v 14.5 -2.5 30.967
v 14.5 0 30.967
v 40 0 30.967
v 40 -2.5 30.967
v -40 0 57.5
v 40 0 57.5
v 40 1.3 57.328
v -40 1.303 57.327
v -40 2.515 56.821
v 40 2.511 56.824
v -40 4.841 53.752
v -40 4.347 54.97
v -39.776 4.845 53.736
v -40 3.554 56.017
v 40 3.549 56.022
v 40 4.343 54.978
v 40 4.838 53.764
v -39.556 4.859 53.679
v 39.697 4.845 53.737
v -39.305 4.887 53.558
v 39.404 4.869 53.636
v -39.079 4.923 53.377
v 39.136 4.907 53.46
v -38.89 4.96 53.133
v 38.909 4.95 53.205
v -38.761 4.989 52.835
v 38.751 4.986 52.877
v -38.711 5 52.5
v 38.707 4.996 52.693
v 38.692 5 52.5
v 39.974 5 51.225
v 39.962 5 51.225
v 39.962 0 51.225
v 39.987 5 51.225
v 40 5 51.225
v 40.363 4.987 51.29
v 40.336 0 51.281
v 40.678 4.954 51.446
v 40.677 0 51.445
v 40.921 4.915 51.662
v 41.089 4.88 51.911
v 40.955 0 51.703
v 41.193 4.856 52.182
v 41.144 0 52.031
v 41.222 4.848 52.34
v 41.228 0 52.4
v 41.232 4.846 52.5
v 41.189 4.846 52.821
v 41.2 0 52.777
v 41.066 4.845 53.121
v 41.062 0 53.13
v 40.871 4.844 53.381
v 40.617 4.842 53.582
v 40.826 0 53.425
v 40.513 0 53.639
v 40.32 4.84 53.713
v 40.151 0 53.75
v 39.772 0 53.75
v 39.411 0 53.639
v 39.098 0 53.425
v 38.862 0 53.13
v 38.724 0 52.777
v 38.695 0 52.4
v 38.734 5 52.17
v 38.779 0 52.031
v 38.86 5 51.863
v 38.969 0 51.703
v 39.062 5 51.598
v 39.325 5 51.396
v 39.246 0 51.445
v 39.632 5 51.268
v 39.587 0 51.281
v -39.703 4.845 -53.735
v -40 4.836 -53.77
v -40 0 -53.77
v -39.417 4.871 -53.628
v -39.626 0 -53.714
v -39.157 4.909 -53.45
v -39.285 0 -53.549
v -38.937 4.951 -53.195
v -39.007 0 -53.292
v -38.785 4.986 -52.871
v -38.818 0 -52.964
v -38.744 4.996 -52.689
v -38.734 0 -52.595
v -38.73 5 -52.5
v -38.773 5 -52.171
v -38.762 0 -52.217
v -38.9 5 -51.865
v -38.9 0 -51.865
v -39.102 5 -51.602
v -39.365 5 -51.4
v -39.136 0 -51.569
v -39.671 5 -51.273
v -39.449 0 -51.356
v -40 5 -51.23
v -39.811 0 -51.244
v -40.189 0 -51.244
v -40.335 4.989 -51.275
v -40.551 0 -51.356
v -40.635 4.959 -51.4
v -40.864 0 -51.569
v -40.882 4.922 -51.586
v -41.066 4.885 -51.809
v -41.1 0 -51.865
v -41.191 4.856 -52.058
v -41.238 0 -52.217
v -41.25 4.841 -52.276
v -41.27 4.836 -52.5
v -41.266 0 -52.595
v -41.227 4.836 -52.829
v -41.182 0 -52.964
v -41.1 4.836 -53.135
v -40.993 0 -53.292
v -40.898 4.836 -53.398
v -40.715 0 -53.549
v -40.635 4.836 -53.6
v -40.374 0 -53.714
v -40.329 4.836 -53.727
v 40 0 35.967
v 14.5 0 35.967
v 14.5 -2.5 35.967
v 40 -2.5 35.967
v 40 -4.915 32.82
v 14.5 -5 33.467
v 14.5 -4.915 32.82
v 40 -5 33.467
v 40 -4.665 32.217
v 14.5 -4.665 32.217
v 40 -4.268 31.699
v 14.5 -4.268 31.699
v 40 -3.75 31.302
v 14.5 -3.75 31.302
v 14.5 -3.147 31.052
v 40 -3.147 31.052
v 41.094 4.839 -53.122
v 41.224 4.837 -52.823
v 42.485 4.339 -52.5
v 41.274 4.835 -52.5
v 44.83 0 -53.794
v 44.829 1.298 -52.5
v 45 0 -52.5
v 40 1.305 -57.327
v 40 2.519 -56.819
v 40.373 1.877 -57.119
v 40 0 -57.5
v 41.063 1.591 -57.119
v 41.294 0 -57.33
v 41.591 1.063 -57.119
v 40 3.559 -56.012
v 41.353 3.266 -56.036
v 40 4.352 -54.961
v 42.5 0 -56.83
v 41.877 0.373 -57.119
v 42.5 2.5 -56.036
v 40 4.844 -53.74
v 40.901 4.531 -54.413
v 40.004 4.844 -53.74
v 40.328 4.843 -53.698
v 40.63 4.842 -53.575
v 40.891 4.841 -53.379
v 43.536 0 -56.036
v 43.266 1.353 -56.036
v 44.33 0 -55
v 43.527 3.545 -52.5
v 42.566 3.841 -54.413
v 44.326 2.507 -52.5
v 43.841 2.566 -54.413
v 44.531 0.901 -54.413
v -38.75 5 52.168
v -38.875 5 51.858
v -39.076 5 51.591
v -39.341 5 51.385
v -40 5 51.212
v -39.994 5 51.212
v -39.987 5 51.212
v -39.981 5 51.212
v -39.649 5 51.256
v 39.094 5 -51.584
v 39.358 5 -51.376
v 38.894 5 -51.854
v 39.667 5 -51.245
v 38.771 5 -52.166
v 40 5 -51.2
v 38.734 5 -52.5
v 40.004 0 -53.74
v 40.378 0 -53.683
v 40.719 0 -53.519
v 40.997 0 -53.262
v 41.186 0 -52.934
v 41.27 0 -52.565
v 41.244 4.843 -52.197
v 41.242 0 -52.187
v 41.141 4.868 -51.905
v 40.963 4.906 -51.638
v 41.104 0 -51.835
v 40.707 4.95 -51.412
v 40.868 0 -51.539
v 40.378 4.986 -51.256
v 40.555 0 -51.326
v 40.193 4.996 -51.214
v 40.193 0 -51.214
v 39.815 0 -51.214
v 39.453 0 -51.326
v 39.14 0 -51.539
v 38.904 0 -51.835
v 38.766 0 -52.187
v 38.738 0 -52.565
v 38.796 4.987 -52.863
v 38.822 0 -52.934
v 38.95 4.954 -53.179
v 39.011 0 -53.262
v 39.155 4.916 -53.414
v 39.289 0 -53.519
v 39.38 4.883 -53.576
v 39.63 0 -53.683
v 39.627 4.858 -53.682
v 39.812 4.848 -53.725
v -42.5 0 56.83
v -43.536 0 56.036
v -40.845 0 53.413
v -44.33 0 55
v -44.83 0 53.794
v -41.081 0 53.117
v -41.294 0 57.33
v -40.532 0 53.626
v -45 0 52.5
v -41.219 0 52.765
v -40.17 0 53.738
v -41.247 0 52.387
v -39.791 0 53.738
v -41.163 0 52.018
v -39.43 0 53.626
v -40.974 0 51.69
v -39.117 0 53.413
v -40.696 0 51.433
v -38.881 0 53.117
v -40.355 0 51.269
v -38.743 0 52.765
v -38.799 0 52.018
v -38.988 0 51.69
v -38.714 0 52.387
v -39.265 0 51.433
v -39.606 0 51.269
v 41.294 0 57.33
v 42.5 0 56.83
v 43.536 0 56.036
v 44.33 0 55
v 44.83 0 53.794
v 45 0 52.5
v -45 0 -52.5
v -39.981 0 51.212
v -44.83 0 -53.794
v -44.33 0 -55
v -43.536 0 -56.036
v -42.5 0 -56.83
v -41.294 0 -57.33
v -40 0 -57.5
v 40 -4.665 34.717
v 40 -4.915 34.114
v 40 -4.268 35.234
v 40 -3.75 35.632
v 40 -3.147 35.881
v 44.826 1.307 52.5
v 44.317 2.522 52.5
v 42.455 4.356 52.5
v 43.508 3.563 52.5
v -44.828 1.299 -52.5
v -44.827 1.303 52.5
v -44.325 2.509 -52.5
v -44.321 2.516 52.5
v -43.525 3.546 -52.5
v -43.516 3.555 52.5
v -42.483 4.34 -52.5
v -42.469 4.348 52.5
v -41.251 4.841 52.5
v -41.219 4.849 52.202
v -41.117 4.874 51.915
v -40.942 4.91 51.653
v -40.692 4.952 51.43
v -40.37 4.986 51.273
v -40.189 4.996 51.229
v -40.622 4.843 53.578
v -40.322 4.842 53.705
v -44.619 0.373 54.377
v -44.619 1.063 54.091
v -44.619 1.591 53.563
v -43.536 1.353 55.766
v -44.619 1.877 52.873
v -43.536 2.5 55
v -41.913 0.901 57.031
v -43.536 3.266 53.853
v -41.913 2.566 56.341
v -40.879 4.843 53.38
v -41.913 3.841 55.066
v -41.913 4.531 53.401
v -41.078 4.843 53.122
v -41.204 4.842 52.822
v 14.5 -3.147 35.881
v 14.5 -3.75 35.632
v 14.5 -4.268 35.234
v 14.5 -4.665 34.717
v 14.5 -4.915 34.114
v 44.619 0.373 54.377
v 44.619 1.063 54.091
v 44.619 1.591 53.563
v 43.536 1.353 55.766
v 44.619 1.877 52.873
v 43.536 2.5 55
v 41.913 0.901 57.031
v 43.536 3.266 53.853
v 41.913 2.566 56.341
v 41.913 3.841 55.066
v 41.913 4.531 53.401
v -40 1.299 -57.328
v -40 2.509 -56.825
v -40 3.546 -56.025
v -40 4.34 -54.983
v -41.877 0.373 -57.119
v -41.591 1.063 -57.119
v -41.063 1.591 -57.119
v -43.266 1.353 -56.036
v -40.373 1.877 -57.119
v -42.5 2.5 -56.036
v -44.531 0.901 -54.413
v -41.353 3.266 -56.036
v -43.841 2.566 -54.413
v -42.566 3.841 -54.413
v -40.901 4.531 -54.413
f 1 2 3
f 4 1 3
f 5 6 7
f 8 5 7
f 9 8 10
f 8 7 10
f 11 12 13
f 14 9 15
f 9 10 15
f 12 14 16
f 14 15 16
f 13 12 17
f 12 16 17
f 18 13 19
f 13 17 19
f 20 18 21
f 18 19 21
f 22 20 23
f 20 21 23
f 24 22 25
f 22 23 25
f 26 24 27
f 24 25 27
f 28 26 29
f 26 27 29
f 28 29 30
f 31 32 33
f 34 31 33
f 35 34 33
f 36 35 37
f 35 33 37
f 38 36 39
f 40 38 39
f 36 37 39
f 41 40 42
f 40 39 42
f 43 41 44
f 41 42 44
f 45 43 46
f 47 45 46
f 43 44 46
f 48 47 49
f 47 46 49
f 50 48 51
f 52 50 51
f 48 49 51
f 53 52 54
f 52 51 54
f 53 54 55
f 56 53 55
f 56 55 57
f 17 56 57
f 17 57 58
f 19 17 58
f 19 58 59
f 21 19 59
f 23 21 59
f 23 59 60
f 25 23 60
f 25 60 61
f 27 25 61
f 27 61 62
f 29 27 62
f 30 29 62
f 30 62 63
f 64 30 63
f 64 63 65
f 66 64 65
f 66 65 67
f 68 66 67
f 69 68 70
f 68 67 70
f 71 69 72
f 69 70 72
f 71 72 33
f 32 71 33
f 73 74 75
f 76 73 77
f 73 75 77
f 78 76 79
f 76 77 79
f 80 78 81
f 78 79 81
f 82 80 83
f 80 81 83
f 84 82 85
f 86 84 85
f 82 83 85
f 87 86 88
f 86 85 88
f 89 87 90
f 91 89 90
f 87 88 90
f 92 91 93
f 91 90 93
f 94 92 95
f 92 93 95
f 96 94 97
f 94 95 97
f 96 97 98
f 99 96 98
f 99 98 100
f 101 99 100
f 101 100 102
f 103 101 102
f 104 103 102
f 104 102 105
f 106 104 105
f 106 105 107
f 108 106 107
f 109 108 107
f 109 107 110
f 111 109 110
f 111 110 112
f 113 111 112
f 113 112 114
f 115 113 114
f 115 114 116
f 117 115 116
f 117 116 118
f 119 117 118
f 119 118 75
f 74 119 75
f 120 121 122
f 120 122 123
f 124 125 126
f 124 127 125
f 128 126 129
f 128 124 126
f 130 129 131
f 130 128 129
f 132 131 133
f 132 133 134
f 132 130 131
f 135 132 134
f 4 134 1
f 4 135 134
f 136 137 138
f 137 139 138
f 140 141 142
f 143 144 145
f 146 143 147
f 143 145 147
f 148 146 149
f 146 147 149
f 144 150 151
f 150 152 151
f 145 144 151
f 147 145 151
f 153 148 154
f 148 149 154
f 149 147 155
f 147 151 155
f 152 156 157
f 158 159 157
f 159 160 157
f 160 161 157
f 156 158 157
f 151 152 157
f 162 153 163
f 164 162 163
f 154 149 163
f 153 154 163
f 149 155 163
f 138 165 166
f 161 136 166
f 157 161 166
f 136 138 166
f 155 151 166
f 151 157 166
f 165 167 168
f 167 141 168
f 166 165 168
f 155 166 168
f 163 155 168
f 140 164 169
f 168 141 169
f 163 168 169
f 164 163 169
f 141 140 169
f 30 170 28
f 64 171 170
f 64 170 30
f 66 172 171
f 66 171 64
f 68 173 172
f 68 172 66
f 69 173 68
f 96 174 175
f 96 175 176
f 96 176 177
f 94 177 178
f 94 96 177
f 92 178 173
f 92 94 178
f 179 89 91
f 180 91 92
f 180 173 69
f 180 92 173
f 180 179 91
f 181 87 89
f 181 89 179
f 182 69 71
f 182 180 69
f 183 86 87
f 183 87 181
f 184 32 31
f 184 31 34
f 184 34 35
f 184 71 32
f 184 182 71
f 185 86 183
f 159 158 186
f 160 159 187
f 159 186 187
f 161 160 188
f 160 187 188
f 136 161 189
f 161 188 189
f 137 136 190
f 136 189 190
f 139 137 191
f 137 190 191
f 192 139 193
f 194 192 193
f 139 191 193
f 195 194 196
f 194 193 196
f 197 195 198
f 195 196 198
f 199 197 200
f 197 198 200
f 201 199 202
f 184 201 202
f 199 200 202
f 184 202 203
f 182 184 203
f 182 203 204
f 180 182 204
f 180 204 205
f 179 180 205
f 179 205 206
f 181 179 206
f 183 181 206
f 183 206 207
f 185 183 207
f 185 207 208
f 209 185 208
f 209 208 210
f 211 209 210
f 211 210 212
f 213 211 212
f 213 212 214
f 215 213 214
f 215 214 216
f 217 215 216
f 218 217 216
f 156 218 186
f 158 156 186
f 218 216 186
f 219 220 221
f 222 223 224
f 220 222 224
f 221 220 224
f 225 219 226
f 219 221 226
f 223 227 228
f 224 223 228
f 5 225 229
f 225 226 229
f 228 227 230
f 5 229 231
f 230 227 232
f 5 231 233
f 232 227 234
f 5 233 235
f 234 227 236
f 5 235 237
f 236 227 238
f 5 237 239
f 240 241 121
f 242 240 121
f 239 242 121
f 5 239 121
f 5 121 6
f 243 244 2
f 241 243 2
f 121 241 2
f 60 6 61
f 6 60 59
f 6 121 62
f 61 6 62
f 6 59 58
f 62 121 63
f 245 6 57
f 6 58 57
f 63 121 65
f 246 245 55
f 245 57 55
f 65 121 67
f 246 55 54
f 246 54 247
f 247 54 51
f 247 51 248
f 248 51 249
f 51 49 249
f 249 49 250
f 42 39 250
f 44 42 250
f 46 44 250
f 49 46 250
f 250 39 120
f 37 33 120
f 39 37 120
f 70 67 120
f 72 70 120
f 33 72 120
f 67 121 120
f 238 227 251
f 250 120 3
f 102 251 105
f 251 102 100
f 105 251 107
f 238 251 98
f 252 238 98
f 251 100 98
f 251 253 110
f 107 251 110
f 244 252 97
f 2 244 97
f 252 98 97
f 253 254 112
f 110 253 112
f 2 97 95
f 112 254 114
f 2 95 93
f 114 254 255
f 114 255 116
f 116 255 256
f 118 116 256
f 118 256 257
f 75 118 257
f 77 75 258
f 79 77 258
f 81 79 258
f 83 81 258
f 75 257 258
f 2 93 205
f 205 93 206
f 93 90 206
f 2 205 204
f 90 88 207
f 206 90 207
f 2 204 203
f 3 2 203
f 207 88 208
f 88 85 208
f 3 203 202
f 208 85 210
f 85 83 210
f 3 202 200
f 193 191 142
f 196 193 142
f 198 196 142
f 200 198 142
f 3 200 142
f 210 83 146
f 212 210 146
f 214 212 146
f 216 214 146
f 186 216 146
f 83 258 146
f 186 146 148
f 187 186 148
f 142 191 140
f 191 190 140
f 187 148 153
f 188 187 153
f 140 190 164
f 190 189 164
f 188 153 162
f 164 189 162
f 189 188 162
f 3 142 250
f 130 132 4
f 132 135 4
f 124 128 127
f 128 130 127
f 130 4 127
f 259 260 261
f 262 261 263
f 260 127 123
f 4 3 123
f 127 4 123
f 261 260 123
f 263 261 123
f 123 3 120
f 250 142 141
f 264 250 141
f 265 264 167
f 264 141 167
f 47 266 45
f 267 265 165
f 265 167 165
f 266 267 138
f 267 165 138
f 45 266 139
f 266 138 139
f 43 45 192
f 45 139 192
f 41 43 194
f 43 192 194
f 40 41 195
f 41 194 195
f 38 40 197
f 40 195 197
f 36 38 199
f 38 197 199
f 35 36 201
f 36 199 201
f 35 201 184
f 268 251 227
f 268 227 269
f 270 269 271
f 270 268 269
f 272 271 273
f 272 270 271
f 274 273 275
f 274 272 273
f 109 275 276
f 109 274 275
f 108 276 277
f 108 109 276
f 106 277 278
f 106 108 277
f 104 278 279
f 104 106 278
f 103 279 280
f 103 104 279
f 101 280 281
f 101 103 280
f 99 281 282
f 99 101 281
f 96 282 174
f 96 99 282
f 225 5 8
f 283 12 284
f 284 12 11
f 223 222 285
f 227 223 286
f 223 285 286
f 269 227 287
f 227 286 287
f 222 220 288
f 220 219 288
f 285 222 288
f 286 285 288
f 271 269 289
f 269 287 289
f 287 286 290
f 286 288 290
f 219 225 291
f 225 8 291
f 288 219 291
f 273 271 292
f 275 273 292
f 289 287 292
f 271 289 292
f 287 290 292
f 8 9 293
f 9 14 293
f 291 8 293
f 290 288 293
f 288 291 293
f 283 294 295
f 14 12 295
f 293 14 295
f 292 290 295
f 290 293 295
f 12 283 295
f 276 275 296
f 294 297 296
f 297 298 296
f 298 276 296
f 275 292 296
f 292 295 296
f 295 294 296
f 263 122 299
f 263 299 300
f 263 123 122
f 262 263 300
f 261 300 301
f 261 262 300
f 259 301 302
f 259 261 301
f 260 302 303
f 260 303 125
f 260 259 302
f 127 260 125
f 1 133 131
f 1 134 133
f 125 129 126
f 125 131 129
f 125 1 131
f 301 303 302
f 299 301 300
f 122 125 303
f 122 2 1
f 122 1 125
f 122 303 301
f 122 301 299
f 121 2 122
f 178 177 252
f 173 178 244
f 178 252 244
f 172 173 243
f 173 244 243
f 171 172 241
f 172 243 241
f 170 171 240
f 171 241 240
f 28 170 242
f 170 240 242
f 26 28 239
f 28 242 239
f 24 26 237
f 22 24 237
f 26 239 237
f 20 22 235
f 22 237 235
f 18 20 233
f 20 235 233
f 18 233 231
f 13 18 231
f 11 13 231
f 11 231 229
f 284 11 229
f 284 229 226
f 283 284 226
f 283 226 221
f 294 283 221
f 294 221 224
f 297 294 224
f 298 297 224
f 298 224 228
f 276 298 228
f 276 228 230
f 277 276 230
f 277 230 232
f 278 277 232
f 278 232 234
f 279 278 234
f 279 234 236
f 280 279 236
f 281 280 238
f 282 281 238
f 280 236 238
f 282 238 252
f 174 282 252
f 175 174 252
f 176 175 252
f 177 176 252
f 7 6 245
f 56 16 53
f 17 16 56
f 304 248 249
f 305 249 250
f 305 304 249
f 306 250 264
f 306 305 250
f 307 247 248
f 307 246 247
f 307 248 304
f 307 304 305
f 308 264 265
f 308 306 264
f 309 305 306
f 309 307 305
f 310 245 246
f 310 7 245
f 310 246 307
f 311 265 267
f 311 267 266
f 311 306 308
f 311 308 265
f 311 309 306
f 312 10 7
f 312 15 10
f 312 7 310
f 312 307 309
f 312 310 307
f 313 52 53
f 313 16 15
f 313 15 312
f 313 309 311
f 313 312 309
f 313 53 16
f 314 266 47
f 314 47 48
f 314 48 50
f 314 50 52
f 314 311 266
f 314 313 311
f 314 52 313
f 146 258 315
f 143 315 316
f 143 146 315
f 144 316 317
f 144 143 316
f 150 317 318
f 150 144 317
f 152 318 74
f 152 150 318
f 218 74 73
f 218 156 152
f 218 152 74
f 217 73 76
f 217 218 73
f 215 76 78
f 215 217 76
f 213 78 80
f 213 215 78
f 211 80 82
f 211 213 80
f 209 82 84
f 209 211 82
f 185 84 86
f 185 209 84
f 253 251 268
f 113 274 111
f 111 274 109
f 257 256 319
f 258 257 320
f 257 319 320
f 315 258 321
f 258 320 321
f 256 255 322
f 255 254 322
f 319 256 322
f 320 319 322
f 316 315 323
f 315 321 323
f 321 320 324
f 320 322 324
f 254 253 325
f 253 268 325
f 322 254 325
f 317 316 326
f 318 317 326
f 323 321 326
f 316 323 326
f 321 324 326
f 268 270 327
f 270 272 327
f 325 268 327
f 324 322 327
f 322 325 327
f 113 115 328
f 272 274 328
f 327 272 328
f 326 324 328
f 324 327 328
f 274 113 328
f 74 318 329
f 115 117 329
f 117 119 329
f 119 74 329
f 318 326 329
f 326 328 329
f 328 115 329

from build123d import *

# Parameters (mm, degrees)
SKETCH1_W           = 90
SKETCH1_H           = 115
BOSS_EXTRUDE1_DEPTH = 5
FILLET4_R           = 5
FILLET5_R           = 5
FILLET6_R           = 5
FILLET7_R           = 5
SKETCH4_W           = 25.5
SKETCH4_H           = 5
BOSS_EXTRUDE2_DEPTH = 5
FILLET12_R          = 2.5
FILLET13_R          = 2.5
SKETCH7_R           = 1.27
CUT_EXTRUDE2_DEPTH  = 74.186405842


with BuildPart() as part:
    # Sketch1 → Boss-Extrude1 (new body)
    with BuildSketch(Plane(origin=(0, 0, 0), x_dir=(1, 0, 0), z_dir=(0, 1, 0))):
        Rectangle(SKETCH1_W, SKETCH1_H)
    extrude(amount=BOSS_EXTRUDE1_DEPTH)

    # Fillet4
    fillet4_edges = [part.edges().sort_by_distance(p)[0] for p in [
        (0, 5, 57.5),
    ]]
    fillet(fillet4_edges, radius=FILLET4_R - 0.0001)  # a hair under: the kernel refuses the full size

    # Fillet5
    fillet5_edges = [part.edges().sort_by_distance(p)[0] for p in [
        (-45, 5, -2.49995),
        (-45, 3.535563195, 56.035563195),
    ]]
    fillet(fillet5_edges, radius=FILLET5_R - 0.0001)  # a hair under: the kernel refuses the full size

    # Fillet6
    fillet6_edges = [part.edges().sort_by_distance(p)[0] for p in [
        (45, 5, -2.49995),
        (45, 3.535563195, 56.035563195),
    ]]
    fillet(fillet6_edges, radius=FILLET6_R - 0.0001)  # a hair under: the kernel refuses the full size

    # Fillet7
    fillet7_edges = [part.edges().sort_by_distance(p)[0] for p in [
        (-43.535563195, 3.535563195, -57.5),
        (0, 5, -57.5),
        (43.535563195, 3.535563195, -57.5),
    ]]
    fillet(fillet7_edges, radius=FILLET7_R - 0.0001)  # a hair under: the kernel refuses the full size

    # Sketch4 → Boss-Extrude2 (add)
    with BuildSketch(Plane.XZ):
        with Locations((27.25, 33.466653617)):
            Rectangle(SKETCH4_W, SKETCH4_H)
    extrude(amount=BOSS_EXTRUDE2_DEPTH)

    # Fillet12
    fillet12_edges = [part.edges().sort_by_distance(p)[0] for p in [
        (27.25, -5, 35.966653617),
    ]]
    fillet(fillet12_edges, radius=FILLET12_R)

    # Fillet13
    fillet13_edges = [part.edges().sort_by_distance(p)[0] for p in [
        (27.25, -5, 30.966653617),
    ]]
    fillet(fillet13_edges, radius=FILLET13_R - 0.0001)  # a hair under: the kernel refuses the full size

    # Sketch7 → Cut-Extrude2 (cut, through all)
    with BuildSketch(Plane.XZ):
        with Locations(Location((-40, -52.5, 0), (0, 0, 270))):
            Circle(SKETCH7_R)
        with Locations(Location((40.003969698, -52.469833039, 0), (0, 0, 270))):
            Circle(SKETCH7_R)
        with Locations(Location((39.961684065, 52.494524109, 0), (0, 0, 270))):
            Circle(SKETCH7_R)
        with Locations(Location((-39.980749964, 52.482200306, 0), (0, 0, 270))):
            Circle(SKETCH7_R)
    extrude(amount=-CUT_EXTRUDE2_DEPTH, mode=Mode.SUBTRACT)


solid = part.part
